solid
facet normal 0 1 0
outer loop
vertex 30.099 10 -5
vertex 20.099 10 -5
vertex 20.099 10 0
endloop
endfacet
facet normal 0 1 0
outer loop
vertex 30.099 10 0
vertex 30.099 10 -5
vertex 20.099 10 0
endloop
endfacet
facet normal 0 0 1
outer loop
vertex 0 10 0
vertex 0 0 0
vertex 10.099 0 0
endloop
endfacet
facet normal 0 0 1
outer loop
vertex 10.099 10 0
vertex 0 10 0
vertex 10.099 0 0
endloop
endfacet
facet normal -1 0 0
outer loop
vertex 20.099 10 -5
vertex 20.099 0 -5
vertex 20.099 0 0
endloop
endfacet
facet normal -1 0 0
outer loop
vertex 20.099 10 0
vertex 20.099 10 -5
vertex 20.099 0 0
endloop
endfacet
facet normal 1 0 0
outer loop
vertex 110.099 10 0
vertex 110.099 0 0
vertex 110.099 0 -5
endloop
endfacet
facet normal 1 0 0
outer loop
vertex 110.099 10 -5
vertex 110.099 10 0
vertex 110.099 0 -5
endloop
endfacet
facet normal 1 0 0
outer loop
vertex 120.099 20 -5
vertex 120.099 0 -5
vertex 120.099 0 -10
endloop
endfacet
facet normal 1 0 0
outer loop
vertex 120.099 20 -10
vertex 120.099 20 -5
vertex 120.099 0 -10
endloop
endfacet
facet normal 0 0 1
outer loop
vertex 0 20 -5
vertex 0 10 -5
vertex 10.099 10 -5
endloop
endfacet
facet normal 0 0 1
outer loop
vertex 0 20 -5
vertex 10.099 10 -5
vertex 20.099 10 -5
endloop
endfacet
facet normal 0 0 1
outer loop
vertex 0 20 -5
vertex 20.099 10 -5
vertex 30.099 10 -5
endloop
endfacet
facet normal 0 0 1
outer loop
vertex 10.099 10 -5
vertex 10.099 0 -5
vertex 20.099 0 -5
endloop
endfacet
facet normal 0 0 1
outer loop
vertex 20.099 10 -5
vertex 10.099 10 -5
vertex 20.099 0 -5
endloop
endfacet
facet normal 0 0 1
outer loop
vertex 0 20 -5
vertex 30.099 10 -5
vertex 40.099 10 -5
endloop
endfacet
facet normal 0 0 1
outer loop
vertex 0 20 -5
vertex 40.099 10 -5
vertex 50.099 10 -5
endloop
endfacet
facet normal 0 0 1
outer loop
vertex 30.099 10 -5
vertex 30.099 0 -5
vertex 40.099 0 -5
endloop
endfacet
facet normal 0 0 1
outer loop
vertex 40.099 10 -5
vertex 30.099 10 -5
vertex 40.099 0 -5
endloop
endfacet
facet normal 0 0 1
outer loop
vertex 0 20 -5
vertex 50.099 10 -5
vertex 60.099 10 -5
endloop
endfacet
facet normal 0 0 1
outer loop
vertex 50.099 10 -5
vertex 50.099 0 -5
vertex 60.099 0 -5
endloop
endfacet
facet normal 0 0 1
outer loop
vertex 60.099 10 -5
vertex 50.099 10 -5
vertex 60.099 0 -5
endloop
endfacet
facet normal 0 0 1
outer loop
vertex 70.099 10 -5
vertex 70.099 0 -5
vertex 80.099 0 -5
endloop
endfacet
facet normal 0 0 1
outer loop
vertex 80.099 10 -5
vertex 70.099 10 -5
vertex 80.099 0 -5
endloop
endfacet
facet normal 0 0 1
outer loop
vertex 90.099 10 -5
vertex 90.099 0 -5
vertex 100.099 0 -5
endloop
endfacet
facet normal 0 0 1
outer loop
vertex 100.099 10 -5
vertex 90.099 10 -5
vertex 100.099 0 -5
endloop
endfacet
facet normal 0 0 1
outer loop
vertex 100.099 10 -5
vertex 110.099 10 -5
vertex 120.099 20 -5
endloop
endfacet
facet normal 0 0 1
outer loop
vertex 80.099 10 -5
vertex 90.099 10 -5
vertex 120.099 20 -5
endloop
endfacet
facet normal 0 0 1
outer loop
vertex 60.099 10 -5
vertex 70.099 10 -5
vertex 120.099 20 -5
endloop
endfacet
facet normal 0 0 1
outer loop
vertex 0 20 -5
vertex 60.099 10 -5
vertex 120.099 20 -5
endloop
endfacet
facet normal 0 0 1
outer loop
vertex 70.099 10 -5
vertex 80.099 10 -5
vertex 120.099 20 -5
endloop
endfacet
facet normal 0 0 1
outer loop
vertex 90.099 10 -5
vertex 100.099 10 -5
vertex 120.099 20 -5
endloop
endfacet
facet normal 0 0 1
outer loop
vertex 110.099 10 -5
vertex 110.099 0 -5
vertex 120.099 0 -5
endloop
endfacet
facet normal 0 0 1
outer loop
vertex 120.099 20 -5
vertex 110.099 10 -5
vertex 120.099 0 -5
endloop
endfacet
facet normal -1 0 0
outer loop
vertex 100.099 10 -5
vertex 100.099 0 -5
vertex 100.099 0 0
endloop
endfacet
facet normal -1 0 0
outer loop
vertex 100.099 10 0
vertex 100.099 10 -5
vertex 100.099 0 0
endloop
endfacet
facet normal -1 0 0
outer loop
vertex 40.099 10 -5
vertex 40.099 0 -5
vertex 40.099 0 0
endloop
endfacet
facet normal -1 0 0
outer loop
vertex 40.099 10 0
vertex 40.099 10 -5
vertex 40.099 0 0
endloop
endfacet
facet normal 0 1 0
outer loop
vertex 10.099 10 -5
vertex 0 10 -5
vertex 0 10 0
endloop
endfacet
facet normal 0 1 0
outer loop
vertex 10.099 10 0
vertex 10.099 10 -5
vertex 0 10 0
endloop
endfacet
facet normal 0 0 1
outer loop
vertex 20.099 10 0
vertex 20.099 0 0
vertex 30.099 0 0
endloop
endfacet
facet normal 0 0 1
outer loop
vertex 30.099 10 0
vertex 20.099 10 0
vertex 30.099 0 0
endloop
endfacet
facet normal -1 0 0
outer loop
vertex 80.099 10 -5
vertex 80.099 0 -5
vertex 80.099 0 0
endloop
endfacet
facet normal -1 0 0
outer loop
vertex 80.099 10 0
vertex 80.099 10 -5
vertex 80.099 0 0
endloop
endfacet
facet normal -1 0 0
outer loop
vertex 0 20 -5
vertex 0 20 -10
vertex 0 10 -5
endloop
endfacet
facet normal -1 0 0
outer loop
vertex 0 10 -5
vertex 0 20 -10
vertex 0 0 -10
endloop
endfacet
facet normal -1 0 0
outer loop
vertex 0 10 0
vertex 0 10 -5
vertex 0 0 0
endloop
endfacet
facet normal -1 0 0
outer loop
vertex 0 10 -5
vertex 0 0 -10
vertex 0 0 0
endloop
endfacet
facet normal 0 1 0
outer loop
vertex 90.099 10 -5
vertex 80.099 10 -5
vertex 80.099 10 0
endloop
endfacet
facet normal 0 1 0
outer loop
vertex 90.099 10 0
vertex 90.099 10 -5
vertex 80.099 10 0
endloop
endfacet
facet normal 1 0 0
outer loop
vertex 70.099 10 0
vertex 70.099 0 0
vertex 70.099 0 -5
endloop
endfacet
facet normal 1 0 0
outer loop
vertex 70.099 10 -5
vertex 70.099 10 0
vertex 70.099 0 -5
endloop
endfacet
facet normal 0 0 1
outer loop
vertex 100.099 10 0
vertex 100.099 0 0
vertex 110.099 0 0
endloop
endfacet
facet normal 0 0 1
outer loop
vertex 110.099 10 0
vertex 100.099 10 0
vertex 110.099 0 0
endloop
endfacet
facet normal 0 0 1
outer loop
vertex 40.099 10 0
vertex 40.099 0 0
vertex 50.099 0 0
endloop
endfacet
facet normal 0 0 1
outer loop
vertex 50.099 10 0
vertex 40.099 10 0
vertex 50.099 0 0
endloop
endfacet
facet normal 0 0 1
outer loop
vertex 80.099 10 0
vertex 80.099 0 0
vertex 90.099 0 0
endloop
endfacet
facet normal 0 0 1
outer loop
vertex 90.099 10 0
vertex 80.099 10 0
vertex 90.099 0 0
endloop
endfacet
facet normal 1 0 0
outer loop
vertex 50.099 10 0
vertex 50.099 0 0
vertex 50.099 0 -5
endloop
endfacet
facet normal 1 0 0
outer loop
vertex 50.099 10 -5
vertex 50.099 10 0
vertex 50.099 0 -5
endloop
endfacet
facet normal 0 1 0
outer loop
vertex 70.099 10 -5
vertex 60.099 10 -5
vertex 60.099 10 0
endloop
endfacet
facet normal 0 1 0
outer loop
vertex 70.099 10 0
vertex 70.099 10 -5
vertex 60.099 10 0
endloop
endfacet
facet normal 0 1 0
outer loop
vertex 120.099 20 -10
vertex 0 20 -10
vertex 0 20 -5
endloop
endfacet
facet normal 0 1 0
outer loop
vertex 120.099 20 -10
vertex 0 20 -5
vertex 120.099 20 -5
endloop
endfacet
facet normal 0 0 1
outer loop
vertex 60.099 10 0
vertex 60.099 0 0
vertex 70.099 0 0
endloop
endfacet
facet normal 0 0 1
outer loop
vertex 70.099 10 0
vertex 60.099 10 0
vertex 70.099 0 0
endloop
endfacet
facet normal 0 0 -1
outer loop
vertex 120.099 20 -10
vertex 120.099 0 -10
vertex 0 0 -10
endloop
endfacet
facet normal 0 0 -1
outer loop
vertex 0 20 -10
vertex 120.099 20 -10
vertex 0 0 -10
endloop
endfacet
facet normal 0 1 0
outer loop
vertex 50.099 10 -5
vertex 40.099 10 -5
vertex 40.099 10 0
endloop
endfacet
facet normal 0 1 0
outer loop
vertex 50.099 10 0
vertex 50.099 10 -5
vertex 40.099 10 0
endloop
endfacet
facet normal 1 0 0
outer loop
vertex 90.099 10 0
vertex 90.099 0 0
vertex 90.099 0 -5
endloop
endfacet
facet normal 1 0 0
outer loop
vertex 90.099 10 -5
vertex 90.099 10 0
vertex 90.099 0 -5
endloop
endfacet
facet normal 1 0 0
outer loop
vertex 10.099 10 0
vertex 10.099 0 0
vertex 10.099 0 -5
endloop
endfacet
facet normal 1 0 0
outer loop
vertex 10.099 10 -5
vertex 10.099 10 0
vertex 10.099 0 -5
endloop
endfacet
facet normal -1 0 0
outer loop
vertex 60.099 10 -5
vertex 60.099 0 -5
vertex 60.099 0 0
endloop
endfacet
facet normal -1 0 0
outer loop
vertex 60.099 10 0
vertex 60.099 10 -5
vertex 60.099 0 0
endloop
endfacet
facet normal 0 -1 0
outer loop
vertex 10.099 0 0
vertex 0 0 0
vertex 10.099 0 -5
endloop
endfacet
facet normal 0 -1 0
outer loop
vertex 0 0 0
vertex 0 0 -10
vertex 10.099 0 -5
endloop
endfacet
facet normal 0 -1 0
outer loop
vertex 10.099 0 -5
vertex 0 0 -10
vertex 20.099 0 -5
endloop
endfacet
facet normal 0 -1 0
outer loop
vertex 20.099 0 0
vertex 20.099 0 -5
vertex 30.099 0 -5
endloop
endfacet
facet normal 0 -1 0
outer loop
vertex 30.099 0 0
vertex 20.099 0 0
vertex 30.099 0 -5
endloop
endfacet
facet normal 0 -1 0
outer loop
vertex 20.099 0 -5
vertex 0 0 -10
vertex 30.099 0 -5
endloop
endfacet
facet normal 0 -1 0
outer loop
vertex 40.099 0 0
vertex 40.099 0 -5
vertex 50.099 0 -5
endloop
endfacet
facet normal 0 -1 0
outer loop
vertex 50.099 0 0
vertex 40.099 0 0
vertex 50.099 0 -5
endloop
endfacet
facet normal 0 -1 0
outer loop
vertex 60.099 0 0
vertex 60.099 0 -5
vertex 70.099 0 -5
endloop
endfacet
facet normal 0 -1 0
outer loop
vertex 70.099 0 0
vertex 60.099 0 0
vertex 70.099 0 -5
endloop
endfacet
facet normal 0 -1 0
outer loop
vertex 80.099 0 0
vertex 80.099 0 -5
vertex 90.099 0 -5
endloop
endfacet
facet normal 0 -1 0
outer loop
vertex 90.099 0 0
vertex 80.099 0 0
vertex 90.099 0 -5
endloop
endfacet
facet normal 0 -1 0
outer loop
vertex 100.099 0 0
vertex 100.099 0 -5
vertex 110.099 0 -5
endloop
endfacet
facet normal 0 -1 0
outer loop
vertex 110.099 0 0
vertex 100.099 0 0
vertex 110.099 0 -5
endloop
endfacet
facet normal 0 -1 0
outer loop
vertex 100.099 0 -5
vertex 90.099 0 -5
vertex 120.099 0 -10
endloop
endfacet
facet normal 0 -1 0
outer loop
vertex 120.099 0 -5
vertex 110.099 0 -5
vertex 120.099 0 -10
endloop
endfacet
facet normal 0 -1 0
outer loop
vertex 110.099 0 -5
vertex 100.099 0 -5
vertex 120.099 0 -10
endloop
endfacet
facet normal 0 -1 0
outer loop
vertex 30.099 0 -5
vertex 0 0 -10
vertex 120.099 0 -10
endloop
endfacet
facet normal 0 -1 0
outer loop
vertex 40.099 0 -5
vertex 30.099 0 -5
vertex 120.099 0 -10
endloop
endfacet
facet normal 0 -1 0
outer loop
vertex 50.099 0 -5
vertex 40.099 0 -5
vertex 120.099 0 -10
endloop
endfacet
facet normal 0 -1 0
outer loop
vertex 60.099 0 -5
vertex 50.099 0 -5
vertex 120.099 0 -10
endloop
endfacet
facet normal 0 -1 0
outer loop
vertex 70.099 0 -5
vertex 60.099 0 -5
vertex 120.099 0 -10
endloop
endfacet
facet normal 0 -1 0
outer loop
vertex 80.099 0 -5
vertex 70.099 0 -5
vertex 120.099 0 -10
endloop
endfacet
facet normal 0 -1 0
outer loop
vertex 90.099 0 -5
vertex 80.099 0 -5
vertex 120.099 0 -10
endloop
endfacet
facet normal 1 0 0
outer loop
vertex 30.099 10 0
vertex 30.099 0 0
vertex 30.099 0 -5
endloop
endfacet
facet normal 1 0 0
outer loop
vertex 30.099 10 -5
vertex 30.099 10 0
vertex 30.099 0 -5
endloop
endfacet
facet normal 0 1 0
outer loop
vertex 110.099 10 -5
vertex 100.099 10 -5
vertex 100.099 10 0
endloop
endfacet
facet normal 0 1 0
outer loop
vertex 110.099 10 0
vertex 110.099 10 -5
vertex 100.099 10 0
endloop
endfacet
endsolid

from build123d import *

# Parameters (mm, degrees)
EXTRUDE_1_DEPTH     = 20
SKETCH_2_W          = 5
SKETCH_2_H          = 10
CUT_EXTRUDE_1_DEPTH = 121.099407002


with BuildPart() as part:
    # Эскиз1 → Бобышка-Вытянуть1 (new body)
    with BuildSketch(Plane(origin=(0, 0, 0), x_dir=(1, 0, 0), z_dir=(0, 1, 0))):
        Polygon((0, 0), (10.099407002, 0), (10.099407002, 5), (20.099407002, 5), (20.099407002, 0), (30.099407002, 0), (30.099407002, 5), (40.099407002, 5), (40.099407002, 0), (50.099407002, 0), (50.099407002, 5), (60.099407002, 5), (60.099407002, 0), (70.099407002, 0), (70.099407002, 5), (80.099407002, 5), (80.099407002, 0), (90.099407002, 0), (90.099407002, 5), (100.099407002, 5), (100.099407002, 0), (110.099407002, 0), (110.099407002, 5), (120.099407002, 5), (120.099407002, 10), (0, 10), align=None)
    extrude(amount=EXTRUDE_1_DEPTH)

    # Эскиз2 → Вырез-Вытянуть1 (cut, through all)
    with BuildSketch(Plane.ZY):
        with Locations((-2.5, 15)):
            Rectangle(SKETCH_2_W, SKETCH_2_H)
    extrude(amount=-CUT_EXTRUDE_1_DEPTH, mode=Mode.SUBTRACT)


solid = part.part
